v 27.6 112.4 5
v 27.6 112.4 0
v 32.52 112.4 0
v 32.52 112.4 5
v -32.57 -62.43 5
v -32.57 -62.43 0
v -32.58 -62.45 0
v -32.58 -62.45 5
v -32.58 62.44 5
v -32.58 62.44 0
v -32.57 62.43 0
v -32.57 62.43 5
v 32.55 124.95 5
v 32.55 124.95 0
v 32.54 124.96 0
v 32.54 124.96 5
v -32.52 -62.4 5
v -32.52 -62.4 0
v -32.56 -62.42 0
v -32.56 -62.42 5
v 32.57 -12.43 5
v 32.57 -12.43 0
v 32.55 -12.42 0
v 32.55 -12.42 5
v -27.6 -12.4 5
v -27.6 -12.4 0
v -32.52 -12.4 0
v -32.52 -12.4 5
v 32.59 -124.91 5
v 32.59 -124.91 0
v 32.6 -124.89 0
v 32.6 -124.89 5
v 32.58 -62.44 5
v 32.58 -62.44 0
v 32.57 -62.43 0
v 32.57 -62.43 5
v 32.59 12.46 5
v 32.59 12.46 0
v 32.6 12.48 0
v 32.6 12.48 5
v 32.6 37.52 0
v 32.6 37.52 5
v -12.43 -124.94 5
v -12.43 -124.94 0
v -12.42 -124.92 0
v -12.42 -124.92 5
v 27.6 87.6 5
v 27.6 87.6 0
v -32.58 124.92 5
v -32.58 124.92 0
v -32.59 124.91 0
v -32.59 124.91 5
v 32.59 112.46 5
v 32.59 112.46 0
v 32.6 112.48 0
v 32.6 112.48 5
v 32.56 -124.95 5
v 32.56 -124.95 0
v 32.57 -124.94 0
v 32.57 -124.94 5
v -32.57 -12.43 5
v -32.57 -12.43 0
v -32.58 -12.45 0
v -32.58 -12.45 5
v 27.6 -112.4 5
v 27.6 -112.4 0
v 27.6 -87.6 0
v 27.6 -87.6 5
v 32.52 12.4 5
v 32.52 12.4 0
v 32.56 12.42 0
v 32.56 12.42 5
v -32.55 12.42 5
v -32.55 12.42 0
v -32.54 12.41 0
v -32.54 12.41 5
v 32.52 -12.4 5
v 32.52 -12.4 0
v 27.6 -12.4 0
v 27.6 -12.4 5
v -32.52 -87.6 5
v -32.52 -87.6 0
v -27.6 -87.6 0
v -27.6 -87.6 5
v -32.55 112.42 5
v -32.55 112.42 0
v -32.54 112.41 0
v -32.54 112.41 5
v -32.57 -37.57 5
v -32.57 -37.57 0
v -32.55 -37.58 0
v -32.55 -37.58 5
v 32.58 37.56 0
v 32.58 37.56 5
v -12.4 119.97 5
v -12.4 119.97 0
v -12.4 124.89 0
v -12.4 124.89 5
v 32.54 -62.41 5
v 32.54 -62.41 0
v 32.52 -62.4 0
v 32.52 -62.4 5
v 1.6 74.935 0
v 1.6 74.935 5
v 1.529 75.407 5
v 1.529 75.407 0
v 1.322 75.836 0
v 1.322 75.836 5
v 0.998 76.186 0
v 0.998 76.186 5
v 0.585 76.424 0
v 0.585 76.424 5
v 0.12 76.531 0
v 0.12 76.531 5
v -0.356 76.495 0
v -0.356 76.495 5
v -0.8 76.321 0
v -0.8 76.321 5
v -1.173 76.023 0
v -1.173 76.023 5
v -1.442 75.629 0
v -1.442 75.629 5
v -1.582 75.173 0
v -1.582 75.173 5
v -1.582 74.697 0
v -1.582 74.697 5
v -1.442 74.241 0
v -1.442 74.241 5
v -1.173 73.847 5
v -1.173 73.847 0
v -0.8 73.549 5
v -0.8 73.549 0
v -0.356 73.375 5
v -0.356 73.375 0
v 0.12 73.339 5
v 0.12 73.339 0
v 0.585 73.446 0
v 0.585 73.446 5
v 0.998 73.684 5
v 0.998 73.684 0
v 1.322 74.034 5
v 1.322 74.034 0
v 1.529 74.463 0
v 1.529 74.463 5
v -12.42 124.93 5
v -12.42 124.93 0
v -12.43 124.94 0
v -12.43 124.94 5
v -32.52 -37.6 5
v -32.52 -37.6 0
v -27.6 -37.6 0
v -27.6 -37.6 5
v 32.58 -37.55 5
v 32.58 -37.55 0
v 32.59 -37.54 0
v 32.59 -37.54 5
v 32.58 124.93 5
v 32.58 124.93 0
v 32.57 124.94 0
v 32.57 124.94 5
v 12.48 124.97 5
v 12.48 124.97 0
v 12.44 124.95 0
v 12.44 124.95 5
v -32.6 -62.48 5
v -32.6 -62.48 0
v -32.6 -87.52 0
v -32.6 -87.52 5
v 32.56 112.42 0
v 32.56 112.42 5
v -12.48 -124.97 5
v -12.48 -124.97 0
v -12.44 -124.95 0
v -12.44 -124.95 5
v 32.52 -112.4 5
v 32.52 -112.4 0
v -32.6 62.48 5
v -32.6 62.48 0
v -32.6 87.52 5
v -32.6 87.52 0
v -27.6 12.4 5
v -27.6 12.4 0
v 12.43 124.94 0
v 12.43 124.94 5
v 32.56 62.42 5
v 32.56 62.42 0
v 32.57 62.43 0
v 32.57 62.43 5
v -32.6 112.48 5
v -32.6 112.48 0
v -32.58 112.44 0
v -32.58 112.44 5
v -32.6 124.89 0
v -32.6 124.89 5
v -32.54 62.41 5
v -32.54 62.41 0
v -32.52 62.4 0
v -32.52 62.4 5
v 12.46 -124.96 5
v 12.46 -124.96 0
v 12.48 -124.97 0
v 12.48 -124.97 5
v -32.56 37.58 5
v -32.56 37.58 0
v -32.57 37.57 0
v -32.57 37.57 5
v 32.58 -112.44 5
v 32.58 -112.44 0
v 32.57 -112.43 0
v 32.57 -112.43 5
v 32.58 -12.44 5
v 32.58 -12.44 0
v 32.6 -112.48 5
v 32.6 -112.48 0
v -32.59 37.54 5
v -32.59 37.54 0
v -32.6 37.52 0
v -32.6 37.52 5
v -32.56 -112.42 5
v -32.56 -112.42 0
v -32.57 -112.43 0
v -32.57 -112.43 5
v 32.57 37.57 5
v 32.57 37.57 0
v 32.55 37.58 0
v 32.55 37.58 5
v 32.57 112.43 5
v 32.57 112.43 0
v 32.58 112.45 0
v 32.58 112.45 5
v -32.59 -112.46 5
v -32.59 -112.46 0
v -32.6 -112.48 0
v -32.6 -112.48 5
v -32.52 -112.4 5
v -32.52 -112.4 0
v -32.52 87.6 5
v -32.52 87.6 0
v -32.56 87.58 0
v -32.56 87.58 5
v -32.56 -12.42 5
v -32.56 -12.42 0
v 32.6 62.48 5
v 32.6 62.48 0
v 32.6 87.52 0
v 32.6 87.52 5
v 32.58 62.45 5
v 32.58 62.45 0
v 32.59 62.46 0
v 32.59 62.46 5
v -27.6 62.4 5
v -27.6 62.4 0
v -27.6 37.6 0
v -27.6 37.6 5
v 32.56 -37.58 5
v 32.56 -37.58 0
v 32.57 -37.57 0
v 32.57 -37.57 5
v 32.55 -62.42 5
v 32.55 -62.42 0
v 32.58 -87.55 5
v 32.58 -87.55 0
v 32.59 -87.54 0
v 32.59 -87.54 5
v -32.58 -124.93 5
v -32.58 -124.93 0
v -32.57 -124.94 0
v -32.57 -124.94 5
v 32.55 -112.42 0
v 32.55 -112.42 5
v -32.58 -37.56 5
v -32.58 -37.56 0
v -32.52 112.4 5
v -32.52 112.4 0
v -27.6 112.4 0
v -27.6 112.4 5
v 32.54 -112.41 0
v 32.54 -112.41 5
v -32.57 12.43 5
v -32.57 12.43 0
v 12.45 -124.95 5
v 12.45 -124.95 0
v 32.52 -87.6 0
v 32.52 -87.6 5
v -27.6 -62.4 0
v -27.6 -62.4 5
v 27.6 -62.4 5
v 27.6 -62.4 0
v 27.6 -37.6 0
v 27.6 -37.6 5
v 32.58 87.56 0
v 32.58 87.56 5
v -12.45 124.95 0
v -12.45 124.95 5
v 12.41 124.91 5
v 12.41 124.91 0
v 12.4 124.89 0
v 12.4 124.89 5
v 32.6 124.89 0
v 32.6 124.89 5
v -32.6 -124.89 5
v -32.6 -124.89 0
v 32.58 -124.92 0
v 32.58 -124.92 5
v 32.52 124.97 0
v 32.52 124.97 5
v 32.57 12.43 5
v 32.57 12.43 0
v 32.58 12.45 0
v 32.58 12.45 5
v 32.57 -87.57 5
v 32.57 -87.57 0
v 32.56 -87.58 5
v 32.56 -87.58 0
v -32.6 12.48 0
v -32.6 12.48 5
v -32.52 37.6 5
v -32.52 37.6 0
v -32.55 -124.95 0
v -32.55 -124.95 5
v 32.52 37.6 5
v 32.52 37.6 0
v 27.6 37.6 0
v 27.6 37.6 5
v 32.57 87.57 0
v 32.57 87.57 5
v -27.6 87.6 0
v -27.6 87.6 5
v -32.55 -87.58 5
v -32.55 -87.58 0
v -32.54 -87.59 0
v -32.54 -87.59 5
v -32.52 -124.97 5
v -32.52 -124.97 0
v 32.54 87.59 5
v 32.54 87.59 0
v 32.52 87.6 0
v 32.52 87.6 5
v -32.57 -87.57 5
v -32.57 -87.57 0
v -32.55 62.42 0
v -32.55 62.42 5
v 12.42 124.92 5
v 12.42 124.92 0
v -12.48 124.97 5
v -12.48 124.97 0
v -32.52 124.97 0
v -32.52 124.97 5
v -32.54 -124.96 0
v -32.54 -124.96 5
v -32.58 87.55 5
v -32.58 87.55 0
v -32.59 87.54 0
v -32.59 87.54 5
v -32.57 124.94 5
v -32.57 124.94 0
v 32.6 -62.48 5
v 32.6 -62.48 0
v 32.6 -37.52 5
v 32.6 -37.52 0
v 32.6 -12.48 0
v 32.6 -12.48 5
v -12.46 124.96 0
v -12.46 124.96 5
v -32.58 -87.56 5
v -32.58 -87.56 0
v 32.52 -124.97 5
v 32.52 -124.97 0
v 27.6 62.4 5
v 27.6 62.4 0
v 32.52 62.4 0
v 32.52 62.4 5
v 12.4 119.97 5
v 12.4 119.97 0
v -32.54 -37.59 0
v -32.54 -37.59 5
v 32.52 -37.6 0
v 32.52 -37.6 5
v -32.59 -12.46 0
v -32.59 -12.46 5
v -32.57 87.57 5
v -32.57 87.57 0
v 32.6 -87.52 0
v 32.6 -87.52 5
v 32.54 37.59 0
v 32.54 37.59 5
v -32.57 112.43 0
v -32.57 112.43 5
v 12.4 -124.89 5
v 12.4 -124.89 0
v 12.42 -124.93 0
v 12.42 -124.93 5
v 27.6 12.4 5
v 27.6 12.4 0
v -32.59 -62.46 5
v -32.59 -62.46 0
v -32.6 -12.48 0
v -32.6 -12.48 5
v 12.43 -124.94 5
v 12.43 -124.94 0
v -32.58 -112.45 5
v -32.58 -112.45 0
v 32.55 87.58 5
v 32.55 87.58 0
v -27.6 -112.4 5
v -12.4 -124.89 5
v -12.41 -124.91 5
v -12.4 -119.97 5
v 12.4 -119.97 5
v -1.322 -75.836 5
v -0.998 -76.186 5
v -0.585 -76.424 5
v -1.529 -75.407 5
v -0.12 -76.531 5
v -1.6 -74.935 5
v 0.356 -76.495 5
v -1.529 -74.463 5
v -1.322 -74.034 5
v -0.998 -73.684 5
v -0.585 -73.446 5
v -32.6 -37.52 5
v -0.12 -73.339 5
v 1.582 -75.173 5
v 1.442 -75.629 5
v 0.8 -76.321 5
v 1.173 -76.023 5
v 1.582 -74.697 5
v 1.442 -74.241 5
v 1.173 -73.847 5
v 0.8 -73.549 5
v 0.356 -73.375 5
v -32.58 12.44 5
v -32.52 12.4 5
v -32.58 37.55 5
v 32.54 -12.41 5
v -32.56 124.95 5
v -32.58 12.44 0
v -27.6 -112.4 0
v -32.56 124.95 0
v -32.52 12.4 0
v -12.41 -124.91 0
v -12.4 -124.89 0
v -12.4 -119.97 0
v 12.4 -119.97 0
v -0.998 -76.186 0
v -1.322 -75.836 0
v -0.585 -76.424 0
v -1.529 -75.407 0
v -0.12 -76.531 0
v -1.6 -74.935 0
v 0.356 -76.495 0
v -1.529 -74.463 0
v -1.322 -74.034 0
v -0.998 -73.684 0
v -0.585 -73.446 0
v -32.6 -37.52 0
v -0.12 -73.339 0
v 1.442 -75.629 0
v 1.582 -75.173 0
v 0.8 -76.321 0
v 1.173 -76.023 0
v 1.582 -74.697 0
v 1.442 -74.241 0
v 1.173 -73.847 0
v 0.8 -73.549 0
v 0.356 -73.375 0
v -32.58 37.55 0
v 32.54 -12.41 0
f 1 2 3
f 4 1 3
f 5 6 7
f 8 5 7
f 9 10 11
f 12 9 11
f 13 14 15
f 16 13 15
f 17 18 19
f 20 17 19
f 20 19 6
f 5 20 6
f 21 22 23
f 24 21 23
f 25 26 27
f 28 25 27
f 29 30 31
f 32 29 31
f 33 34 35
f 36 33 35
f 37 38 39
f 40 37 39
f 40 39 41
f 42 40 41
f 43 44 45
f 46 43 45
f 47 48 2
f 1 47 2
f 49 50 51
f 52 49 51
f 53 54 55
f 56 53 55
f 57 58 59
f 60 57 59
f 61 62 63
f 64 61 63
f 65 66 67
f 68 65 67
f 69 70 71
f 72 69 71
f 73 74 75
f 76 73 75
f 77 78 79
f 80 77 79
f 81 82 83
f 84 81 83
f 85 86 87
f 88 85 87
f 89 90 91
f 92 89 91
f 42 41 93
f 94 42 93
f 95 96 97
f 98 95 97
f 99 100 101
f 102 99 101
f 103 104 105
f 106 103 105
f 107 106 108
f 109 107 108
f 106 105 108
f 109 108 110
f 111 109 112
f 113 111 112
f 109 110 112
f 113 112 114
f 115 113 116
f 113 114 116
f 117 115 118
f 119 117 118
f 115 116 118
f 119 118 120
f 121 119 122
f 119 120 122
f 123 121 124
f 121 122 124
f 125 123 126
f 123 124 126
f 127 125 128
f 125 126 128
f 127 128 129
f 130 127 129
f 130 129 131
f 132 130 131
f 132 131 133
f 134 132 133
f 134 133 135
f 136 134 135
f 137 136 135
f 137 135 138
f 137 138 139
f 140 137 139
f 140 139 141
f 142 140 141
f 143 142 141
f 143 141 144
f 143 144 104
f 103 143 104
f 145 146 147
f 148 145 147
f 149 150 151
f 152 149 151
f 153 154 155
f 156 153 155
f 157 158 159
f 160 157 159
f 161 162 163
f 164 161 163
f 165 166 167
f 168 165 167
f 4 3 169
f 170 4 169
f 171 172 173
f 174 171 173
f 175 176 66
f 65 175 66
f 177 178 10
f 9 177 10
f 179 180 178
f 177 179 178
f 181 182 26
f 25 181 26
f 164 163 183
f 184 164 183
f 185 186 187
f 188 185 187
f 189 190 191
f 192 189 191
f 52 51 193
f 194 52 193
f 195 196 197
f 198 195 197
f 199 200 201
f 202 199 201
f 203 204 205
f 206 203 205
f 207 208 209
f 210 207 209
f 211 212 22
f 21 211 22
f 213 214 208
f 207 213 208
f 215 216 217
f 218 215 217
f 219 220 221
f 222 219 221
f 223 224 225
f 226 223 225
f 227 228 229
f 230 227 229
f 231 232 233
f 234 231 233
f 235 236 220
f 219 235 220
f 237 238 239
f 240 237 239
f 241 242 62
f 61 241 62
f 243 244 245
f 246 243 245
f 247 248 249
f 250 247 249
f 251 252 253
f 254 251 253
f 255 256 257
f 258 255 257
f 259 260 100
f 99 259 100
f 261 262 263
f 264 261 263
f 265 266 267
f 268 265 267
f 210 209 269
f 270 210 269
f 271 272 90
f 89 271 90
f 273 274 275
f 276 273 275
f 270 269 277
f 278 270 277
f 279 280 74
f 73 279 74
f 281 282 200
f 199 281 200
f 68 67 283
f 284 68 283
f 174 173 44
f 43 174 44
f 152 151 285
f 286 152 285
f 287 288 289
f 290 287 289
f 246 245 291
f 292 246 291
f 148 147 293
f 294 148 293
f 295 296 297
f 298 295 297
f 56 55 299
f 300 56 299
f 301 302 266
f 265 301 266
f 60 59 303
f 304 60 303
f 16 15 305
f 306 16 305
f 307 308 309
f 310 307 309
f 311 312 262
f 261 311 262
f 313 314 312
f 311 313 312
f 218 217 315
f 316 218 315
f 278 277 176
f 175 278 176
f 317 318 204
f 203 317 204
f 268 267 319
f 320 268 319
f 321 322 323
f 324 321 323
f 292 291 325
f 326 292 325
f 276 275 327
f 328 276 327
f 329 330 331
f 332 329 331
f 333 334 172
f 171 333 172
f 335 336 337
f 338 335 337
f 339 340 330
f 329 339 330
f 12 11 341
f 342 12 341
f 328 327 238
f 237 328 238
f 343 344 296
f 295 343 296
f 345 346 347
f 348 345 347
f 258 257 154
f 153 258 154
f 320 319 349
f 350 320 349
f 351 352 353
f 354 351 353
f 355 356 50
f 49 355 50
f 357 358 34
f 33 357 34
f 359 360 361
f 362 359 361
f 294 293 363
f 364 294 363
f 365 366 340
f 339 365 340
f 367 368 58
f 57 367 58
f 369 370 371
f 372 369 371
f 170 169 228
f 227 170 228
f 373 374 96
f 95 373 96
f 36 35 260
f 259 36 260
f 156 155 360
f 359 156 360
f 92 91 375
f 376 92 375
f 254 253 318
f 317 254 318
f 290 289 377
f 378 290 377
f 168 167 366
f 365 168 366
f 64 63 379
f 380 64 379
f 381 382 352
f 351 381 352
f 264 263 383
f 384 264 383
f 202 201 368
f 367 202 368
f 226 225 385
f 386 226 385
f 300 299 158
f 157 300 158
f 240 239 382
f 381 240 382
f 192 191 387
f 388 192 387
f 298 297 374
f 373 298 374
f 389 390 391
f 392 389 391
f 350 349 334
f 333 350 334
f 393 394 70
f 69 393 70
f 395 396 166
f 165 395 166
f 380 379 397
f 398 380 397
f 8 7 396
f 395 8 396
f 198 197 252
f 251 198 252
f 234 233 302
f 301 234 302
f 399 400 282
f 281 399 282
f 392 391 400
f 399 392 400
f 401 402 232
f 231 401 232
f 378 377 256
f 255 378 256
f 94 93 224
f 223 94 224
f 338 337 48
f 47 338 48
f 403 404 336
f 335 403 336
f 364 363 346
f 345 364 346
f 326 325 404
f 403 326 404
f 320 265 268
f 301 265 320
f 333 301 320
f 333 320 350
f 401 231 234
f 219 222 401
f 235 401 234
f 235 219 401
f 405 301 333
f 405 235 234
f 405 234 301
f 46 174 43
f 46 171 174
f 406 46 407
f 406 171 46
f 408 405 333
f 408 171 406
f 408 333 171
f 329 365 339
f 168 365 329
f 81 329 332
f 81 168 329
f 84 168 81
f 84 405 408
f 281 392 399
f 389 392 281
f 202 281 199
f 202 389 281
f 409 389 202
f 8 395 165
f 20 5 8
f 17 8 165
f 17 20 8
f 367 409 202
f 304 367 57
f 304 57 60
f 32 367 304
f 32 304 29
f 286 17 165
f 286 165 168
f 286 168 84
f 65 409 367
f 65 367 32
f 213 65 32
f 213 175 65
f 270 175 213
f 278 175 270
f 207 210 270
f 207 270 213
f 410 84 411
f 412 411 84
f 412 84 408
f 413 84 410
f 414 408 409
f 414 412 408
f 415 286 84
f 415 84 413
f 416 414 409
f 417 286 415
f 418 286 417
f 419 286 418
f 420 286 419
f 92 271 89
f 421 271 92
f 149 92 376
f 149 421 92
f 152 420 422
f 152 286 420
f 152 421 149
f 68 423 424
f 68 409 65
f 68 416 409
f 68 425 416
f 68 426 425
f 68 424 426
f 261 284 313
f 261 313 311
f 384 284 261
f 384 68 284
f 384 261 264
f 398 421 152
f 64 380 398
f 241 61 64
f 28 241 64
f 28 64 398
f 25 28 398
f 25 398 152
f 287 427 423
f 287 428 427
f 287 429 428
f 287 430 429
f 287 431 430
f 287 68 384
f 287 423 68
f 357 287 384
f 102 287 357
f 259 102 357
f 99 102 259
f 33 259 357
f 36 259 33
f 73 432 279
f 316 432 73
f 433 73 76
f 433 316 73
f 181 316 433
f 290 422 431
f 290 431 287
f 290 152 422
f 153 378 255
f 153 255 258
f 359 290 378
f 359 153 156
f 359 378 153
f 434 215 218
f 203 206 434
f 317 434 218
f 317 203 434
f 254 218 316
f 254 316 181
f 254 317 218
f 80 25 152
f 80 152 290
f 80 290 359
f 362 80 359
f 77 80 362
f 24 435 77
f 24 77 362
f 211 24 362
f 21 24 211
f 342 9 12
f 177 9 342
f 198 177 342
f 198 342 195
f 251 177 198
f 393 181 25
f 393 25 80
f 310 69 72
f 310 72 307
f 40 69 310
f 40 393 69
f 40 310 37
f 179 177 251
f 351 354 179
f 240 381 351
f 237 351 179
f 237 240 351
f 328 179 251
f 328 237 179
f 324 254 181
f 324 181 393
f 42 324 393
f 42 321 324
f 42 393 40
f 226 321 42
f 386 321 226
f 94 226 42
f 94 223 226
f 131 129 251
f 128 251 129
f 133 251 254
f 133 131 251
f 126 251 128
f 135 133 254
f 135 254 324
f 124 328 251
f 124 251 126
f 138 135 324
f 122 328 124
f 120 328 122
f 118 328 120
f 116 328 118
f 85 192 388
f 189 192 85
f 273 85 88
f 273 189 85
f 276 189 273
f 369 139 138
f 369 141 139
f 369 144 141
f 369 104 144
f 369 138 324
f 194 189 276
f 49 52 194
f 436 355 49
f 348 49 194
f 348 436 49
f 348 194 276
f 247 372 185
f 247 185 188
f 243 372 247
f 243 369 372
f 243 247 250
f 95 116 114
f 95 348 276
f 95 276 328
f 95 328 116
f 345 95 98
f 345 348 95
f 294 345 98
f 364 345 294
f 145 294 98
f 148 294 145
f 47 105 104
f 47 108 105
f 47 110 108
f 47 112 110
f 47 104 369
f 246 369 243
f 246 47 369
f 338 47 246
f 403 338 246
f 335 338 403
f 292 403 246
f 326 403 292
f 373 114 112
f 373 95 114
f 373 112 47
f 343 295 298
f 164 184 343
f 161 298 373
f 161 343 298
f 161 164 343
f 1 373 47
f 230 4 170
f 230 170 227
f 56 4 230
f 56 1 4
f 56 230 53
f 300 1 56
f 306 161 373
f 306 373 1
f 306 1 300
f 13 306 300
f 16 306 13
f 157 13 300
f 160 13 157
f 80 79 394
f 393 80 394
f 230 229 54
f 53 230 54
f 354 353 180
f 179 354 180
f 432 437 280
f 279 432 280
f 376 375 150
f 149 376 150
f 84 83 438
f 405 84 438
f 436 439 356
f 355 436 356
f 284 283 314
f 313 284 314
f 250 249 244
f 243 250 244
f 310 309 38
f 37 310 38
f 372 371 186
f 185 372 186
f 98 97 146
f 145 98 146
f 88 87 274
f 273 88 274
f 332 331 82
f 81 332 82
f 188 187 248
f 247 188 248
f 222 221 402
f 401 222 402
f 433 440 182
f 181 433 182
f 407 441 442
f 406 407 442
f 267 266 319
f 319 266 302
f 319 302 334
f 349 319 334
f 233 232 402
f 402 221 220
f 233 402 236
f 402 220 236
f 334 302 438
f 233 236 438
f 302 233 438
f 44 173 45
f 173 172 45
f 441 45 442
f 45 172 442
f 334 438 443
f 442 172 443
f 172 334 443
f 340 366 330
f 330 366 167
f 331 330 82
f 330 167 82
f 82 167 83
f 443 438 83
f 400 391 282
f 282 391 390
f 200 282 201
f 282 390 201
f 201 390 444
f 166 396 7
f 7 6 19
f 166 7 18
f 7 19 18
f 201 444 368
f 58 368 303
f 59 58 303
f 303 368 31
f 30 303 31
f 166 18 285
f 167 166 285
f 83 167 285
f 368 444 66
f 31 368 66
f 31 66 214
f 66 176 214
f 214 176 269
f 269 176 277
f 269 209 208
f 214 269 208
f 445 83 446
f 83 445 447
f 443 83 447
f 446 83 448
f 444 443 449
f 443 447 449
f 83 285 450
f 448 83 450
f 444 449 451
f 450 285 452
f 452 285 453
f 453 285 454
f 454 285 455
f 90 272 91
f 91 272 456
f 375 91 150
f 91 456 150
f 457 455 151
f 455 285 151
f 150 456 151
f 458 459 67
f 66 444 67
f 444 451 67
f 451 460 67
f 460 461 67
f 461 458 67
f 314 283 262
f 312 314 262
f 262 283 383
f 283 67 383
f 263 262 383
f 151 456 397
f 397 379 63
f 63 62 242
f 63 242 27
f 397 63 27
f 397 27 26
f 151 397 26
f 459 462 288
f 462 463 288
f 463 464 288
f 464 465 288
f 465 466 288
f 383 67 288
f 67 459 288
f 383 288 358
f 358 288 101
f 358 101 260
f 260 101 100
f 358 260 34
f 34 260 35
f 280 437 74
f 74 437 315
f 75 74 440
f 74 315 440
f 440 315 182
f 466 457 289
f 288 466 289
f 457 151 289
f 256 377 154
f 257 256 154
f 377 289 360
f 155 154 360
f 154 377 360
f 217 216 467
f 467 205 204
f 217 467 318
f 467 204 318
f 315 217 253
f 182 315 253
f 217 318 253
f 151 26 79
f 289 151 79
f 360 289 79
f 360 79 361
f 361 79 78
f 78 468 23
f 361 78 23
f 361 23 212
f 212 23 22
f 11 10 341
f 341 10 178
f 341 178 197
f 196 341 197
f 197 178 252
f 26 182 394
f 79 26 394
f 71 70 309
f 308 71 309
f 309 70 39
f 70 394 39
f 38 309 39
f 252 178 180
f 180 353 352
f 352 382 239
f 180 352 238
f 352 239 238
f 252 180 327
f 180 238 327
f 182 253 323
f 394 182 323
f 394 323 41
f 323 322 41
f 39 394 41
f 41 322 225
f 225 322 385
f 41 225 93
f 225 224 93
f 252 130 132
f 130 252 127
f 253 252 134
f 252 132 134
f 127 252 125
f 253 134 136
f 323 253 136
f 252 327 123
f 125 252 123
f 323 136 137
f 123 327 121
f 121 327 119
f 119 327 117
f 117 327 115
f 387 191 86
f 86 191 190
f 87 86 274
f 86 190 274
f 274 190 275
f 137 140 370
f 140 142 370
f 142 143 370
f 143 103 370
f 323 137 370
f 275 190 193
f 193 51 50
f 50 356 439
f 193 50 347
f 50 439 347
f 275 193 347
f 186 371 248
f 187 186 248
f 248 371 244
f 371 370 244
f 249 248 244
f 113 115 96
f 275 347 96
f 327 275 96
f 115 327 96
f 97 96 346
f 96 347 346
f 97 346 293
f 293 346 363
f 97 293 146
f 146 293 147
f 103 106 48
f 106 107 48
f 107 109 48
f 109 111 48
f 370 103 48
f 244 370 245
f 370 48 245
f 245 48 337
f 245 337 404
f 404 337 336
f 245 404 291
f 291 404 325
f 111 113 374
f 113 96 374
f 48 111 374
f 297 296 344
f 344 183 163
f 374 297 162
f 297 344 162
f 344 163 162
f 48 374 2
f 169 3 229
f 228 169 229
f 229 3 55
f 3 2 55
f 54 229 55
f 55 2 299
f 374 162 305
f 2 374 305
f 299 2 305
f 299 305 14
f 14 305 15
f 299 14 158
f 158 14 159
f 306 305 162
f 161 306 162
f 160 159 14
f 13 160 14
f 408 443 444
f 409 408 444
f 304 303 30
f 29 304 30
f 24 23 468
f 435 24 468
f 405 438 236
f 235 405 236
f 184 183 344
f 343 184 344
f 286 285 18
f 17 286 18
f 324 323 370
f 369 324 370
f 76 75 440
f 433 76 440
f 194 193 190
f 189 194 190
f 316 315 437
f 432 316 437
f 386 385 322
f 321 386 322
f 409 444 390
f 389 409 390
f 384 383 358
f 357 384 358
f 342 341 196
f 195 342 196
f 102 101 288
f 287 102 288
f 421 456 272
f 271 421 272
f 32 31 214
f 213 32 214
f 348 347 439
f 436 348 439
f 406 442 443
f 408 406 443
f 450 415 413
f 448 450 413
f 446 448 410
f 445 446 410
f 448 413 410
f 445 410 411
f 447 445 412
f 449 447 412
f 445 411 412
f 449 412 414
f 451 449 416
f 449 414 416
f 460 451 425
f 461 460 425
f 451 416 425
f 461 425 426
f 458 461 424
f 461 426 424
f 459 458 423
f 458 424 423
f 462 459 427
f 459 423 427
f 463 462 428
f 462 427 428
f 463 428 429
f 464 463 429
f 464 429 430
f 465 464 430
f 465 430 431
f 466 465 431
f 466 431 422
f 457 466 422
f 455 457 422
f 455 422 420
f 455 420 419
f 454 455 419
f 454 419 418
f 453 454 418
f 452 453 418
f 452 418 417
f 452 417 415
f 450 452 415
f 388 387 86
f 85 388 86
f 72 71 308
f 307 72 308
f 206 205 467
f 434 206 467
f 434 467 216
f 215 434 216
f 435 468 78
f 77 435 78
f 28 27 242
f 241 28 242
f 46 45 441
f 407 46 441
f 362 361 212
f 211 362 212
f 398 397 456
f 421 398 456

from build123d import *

# Parameters (mm, degrees)
BOSS_EXTRUDE1_DEPTH = 5
SKETCH1_R           = 1.6
CUT_EXTRUDE2_DEPTH  = 130.248833264


with BuildPart() as part:
    # Model → Boss-Extrude1 (new body)
    with BuildSketch(Plane.XY):
        Polygon((-12.44, -124.95), (-12.43, -124.94), (-12.42, -124.92), (-12.41, -124.91), (-12.4, -124.89), (-12.4, -119.97), (12.4, -119.97), (12.4, -124.89), (12.42, -124.93), (12.43, -124.94), (12.45, -124.95), (12.46, -124.96), (12.48, -124.97), (32.52, -124.97), (32.56, -124.95), (32.57, -124.94), (32.58, -124.92), (32.59, -124.91), (32.6, -124.89), (32.6, -112.48), (32.58, -112.44), (32.57, -112.43), (32.55, -112.42), (32.54, -112.41), (32.52, -112.4), (27.6, -112.4), (27.6, -87.6), (32.52, -87.6), (32.56, -87.58), (32.57, -87.57), (32.58, -87.55), (32.59, -87.54), (32.6, -87.52), (32.6, -62.48), (32.58, -62.44), (32.57, -62.43), (32.55, -62.42), (32.54, -62.41), (32.52, -62.4), (27.6, -62.4), (27.6, -37.6), (32.52, -37.6), (32.56, -37.58), (32.57, -37.57), (32.58, -37.55), (32.59, -37.54), (32.6, -37.52), (32.6, -12.48), (32.58, -12.44), (32.57, -12.43), (32.55, -12.42), (32.54, -12.41), (32.52, -12.4), (27.6, -12.4), (27.6, 12.4), (32.52, 12.4), (32.56, 12.42), (32.57, 12.43), (32.58, 12.45), (32.59, 12.46), (32.6, 12.48), (32.6, 37.52), (32.58, 37.56), (32.57, 37.57), (32.55, 37.58), (32.54, 37.59), (32.52, 37.6), (27.6, 37.6), (27.6, 62.4), (32.52, 62.4), (32.56, 62.42), (32.57, 62.43), (32.58, 62.45), (32.59, 62.46), (32.6, 62.48), (32.6, 87.52), (32.58, 87.56), (32.57, 87.57), (32.55, 87.58), (32.54, 87.59), (32.52, 87.6), (27.6, 87.6), (27.6, 112.4), (32.52, 112.4), (32.56, 112.42), (32.57, 112.43), (32.58, 112.45), (32.59, 112.46), (32.6, 112.48), (32.6, 124.89), (32.58, 124.93), (32.57, 124.94), (32.55, 124.95), (32.54, 124.96), (32.52, 124.97), (12.48, 124.97), (12.44, 124.95), (12.43, 124.94), (12.42, 124.92), (12.41, 124.91), (12.4, 124.89), (12.4, 119.97), (-12.4, 119.97), (-12.4, 124.89), (-12.42, 124.93), (-12.43, 124.94), (-12.45, 124.95), (-12.46, 124.96), (-12.48, 124.97), (-32.52, 124.97), (-32.56, 124.95), (-32.57, 124.94), (-32.58, 124.92), (-32.59, 124.91), (-32.6, 124.89), (-32.6, 112.48), (-32.58, 112.44), (-32.57, 112.43), (-32.55, 112.42), (-32.54, 112.41), (-32.52, 112.4), (-27.6, 112.4), (-27.6, 87.6), (-32.52, 87.6), (-32.56, 87.58), (-32.57, 87.57), (-32.58, 87.55), (-32.59, 87.54), (-32.6, 87.52), (-32.6, 62.48), (-32.58, 62.44), (-32.57, 62.43), (-32.55, 62.42), (-32.54, 62.41), (-32.52, 62.4), (-27.6, 62.4), (-27.6, 37.6), (-32.52, 37.6), (-32.56, 37.58), (-32.57, 37.57), (-32.58, 37.55), (-32.59, 37.54), (-32.6, 37.52), (-32.6, 12.48), (-32.58, 12.44), (-32.57, 12.43), (-32.55, 12.42), (-32.54, 12.41), (-32.52, 12.4), (-27.6, 12.4), (-27.6, -12.4), (-32.52, -12.4), (-32.56, -12.42), (-32.57, -12.43), (-32.58, -12.45), (-32.59, -12.46), (-32.6, -12.48), (-32.6, -37.52), (-32.58, -37.56), (-32.57, -37.57), (-32.55, -37.58), (-32.54, -37.59), (-32.52, -37.6), (-27.6, -37.6), (-27.6, -62.4), (-32.52, -62.4), (-32.56, -62.42), (-32.57, -62.43), (-32.58, -62.45), (-32.59, -62.46), (-32.6, -62.48), (-32.6, -87.52), (-32.58, -87.56), (-32.57, -87.57), (-32.55, -87.58), (-32.54, -87.59), (-32.52, -87.6), (-27.6, -87.6), (-27.6, -112.4), (-32.52, -112.4), (-32.56, -112.42), (-32.57, -112.43), (-32.58, -112.45), (-32.59, -112.46), (-32.6, -112.48), (-32.6, -124.89), (-32.58, -124.93), (-32.57, -124.94), (-32.55, -124.95), (-32.54, -124.96), (-32.52, -124.97), (-12.48, -124.97), align=None)
    extrude(amount=BOSS_EXTRUDE1_DEPTH)

    # Sketch1 → Cut-Extrude2 (cut, through all)
    with BuildSketch(Plane.XY.offset(5)):
        with Locations((0, 74.935)):
            Circle(SKETCH1_R)
        with Locations(Location((0, -74.935, 0), (0, 0, 180))):
            Circle(SKETCH1_R)
    extrude(amount=-CUT_EXTRUDE2_DEPTH, mode=Mode.SUBTRACT)


solid = part.part
